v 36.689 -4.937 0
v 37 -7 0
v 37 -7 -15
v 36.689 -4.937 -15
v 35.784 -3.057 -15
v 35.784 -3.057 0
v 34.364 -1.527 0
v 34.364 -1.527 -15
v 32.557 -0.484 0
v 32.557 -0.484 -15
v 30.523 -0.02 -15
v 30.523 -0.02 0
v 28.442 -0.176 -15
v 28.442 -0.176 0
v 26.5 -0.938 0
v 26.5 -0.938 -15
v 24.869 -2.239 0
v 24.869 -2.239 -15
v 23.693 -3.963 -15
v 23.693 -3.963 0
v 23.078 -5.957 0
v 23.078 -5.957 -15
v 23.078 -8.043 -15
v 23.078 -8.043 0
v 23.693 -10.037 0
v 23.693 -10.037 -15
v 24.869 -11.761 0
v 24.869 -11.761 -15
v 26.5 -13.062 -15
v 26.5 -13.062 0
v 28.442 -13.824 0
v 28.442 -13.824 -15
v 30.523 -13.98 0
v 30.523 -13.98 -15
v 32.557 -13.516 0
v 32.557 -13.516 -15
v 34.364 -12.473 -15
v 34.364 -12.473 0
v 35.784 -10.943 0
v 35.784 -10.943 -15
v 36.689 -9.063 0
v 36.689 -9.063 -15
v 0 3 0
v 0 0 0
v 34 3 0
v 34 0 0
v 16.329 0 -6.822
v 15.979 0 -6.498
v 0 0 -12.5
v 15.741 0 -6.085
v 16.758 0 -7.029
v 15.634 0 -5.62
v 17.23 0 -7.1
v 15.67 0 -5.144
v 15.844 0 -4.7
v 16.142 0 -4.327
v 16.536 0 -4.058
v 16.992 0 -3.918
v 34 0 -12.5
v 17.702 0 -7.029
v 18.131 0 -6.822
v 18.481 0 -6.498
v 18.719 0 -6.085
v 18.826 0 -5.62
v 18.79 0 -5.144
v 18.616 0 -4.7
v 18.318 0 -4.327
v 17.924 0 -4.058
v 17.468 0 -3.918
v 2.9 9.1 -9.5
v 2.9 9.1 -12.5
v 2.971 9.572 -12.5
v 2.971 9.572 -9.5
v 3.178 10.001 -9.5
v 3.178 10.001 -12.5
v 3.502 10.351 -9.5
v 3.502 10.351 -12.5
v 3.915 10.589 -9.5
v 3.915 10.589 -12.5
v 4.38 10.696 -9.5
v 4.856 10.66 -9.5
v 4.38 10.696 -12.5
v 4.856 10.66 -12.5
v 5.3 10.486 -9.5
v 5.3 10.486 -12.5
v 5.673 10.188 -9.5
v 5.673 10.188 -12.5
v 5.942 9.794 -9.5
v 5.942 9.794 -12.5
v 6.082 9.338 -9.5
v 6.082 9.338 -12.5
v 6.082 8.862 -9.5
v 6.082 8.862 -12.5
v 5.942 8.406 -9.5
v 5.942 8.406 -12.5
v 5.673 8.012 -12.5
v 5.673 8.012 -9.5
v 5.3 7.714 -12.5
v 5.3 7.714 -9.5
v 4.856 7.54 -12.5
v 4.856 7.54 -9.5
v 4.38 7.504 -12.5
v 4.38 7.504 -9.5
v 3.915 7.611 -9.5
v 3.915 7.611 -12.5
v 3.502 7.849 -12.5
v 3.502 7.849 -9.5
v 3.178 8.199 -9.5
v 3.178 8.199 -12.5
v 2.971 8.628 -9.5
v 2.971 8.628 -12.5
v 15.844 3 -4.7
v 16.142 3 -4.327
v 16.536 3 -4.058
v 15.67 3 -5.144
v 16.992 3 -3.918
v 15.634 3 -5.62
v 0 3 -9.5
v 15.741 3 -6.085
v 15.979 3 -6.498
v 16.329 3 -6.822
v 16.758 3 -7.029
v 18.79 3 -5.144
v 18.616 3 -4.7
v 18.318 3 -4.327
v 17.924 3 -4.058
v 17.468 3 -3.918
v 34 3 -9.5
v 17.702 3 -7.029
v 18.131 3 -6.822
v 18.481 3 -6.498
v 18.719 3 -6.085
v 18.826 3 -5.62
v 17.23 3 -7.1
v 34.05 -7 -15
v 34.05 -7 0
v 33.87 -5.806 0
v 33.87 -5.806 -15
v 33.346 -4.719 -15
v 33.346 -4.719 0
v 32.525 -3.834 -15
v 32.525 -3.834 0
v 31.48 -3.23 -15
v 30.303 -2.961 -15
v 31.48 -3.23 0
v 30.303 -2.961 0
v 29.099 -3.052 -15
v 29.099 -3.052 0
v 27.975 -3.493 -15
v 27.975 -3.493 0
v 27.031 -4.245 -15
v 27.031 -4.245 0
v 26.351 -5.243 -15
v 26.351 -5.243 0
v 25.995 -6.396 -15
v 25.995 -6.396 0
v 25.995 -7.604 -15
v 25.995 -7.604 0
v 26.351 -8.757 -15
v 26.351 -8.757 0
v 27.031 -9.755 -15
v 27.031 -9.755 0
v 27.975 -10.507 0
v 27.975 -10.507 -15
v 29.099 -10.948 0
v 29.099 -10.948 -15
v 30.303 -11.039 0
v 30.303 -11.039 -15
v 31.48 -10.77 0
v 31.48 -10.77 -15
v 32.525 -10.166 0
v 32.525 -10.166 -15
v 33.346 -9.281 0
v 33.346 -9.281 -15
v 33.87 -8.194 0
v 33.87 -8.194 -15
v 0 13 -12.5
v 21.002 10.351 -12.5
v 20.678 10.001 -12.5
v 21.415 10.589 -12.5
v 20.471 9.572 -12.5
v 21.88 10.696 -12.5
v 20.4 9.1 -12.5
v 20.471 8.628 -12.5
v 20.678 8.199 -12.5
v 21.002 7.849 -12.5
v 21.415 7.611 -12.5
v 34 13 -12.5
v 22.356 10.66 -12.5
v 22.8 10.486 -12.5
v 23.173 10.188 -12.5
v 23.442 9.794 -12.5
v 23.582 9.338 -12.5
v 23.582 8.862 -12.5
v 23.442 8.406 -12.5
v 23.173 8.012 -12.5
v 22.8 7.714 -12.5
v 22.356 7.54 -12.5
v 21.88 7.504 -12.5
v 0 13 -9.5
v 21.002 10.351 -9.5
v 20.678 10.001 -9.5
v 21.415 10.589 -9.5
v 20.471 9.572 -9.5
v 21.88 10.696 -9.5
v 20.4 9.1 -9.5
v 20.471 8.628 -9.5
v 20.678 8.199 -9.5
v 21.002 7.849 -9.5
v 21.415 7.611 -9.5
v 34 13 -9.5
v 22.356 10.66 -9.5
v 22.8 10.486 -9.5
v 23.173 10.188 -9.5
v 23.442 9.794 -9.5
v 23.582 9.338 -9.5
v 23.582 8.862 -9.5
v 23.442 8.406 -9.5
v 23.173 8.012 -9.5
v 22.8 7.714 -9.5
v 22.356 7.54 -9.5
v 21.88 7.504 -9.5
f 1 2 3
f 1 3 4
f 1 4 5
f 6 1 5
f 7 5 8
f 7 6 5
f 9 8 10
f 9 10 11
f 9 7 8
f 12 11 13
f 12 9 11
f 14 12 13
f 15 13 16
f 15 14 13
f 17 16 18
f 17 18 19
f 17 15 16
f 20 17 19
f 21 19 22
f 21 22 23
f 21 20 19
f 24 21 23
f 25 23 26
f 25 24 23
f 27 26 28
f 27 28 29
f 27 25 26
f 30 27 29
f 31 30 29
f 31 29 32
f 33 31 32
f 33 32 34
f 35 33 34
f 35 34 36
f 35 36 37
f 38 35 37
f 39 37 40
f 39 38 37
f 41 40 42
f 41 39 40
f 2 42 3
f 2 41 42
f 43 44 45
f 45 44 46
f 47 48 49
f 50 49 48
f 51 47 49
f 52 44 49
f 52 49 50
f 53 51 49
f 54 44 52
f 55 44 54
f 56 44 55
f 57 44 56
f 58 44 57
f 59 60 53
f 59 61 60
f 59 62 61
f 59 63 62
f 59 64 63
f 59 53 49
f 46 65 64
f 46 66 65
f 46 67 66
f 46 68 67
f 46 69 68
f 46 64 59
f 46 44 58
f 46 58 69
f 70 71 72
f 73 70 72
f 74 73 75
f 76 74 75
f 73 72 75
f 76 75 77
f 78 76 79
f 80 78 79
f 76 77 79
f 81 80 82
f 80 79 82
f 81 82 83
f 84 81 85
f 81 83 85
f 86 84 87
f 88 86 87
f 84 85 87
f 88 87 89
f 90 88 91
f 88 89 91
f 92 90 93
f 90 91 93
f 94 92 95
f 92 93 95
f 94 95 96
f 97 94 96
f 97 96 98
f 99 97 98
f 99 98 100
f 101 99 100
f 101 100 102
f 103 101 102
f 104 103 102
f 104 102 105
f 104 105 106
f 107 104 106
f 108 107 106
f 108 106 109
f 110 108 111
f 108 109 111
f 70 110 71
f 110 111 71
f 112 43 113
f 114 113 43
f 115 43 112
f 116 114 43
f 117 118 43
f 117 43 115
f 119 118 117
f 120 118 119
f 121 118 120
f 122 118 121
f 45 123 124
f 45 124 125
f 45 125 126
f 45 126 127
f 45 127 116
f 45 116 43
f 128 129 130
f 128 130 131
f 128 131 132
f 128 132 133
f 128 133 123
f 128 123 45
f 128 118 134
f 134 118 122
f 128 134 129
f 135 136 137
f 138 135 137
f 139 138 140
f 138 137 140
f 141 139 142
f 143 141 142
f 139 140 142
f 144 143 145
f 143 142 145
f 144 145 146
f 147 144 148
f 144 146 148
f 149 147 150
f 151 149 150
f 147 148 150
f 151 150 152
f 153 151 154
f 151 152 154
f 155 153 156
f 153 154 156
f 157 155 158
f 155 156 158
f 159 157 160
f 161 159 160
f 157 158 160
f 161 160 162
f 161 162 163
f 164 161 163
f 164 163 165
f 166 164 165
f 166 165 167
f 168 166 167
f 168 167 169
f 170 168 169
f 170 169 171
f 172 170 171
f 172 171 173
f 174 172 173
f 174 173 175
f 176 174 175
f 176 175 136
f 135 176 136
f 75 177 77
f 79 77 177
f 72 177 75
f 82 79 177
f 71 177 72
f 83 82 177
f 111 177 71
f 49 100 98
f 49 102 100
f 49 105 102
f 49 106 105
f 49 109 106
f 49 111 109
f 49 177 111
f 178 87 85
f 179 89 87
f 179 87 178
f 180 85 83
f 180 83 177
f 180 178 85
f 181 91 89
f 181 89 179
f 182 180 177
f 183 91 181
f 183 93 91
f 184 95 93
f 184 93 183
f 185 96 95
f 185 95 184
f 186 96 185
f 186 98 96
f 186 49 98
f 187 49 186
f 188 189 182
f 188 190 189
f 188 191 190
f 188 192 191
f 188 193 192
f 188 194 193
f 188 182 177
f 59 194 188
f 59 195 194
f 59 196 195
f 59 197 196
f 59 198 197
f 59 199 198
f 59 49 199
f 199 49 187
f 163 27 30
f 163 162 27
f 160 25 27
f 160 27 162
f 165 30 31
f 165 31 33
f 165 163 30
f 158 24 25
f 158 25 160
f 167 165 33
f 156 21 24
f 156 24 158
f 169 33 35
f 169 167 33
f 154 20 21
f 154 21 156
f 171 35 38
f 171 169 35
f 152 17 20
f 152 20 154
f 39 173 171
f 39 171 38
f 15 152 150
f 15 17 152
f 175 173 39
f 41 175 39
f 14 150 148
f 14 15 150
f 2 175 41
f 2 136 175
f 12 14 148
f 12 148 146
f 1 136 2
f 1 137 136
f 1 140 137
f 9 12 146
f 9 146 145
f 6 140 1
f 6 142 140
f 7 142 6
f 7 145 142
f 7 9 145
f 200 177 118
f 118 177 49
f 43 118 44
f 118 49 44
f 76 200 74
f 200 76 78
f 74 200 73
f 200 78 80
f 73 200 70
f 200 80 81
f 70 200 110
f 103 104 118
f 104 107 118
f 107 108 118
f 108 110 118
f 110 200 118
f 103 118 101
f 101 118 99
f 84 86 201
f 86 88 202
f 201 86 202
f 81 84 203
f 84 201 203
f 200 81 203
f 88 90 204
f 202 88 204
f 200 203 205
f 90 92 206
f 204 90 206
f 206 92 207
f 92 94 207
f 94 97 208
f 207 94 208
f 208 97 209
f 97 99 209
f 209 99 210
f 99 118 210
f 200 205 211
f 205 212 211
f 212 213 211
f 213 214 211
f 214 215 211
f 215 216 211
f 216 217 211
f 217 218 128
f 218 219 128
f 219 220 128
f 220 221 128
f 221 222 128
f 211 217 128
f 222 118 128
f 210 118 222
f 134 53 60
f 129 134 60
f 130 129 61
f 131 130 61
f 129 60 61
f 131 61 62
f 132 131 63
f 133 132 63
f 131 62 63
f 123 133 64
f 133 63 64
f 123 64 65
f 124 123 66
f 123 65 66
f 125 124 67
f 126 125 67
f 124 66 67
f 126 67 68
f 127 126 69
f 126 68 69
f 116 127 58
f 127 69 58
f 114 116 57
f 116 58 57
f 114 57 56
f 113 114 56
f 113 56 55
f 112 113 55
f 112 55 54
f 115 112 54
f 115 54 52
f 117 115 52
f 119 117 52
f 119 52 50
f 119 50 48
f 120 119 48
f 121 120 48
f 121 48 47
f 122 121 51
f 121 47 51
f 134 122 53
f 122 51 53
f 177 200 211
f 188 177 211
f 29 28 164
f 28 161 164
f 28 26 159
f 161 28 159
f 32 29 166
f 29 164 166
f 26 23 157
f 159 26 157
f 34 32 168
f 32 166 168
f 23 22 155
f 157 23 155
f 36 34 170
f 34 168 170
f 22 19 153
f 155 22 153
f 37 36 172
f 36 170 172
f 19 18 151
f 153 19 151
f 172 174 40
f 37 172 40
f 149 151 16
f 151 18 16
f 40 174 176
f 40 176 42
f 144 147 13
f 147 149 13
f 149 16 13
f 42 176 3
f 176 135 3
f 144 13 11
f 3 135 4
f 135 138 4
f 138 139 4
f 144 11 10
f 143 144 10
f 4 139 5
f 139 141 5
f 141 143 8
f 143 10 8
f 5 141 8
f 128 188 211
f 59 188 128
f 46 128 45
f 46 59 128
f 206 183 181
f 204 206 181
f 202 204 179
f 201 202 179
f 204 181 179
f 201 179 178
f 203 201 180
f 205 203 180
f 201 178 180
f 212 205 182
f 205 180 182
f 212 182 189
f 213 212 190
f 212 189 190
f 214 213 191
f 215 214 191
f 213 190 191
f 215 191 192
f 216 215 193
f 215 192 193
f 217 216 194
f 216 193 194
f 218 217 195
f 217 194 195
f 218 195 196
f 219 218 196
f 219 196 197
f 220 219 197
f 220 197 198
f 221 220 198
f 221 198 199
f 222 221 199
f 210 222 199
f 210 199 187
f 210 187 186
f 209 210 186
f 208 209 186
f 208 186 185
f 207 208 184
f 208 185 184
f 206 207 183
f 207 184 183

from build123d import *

# Parameters (mm, degrees)
CROQUIS1_W              = 34
CROQUIS1_H              = 9.5
SALIENTE_EXTRUIR1_DEPTH = 3
CROQUIS2_W              = 34
CROQUIS2_H              = 3
SALIENTE_EXTRUIR2_DEPTH = 13
CROQUIS3_R              = 1.6
CORTAR_EXTRUIR1_DEPTH   = 3
CROQUIS4_R              = 1.6
CORTAR_EXTRUIR2_DEPTH   = 3
CROQUIS5_R              = 7
SALIENTE_EXTRUIR3_DEPTH = 15
CROQUIS6_R              = 4.05
CORTAR_EXTRUIR3_DEPTH   = 43.308391603


with BuildPart() as part:
    # Croquis1 → Saliente-Extruir1 (new body)
    with BuildSketch(Plane(origin=(0, 0, 0), x_dir=(1, 0, 0), z_dir=(0, 1, 0))):
        with Locations((17, 4.75)):
            Rectangle(CROQUIS1_W, CROQUIS1_H)
    extrude(amount=SALIENTE_EXTRUIR1_DEPTH)

    # Croquis2 → Saliente-Extruir2 (add)
    with BuildSketch(Plane.XZ):
        with Locations((17, -11)):
            Rectangle(CROQUIS2_W, CROQUIS2_H)
    extrude(amount=-SALIENTE_EXTRUIR2_DEPTH)

    # Croquis3 → Cortar-Extruir1 (cut)
    with BuildSketch(Plane(origin=(0, 0, -12.5), x_dir=(-1, 0, 0), z_dir=(0, 0, -1))):
        with Locations((-4.5, 9.1)):
            Circle(CROQUIS3_R)
        with Locations((-22, 9.1)):
            Circle(CROQUIS3_R)
    extrude(amount=-CORTAR_EXTRUIR1_DEPTH, mode=Mode.SUBTRACT)

    # Croquis4 → Cortar-Extruir2 (cut)
    with BuildSketch(Plane.XZ):
        with Locations(Location((17.23, -5.5, 0), (0, 0, 270))):
            Circle(CROQUIS4_R)
    extrude(amount=-CORTAR_EXTRUIR2_DEPTH, mode=Mode.SUBTRACT)


with BuildPart() as body_2:
    # Croquis5 → Saliente-Extruir3 (new body)
    with BuildSketch(Plane.XY):
        with Locations((30, -7)):
            Circle(CROQUIS5_R)
    extrude(amount=-SALIENTE_EXTRUIR3_DEPTH)

    # Croquis6 → Cortar-Extruir3 (cut, through all)
    with BuildSketch(Plane.XY):
        with Locations((30, -7)):
            Circle(CROQUIS6_R)
    extrude(amount=-CORTAR_EXTRUIR3_DEPTH, mode=Mode.SUBTRACT)


solid = Compound([part.part, body_2.part])
